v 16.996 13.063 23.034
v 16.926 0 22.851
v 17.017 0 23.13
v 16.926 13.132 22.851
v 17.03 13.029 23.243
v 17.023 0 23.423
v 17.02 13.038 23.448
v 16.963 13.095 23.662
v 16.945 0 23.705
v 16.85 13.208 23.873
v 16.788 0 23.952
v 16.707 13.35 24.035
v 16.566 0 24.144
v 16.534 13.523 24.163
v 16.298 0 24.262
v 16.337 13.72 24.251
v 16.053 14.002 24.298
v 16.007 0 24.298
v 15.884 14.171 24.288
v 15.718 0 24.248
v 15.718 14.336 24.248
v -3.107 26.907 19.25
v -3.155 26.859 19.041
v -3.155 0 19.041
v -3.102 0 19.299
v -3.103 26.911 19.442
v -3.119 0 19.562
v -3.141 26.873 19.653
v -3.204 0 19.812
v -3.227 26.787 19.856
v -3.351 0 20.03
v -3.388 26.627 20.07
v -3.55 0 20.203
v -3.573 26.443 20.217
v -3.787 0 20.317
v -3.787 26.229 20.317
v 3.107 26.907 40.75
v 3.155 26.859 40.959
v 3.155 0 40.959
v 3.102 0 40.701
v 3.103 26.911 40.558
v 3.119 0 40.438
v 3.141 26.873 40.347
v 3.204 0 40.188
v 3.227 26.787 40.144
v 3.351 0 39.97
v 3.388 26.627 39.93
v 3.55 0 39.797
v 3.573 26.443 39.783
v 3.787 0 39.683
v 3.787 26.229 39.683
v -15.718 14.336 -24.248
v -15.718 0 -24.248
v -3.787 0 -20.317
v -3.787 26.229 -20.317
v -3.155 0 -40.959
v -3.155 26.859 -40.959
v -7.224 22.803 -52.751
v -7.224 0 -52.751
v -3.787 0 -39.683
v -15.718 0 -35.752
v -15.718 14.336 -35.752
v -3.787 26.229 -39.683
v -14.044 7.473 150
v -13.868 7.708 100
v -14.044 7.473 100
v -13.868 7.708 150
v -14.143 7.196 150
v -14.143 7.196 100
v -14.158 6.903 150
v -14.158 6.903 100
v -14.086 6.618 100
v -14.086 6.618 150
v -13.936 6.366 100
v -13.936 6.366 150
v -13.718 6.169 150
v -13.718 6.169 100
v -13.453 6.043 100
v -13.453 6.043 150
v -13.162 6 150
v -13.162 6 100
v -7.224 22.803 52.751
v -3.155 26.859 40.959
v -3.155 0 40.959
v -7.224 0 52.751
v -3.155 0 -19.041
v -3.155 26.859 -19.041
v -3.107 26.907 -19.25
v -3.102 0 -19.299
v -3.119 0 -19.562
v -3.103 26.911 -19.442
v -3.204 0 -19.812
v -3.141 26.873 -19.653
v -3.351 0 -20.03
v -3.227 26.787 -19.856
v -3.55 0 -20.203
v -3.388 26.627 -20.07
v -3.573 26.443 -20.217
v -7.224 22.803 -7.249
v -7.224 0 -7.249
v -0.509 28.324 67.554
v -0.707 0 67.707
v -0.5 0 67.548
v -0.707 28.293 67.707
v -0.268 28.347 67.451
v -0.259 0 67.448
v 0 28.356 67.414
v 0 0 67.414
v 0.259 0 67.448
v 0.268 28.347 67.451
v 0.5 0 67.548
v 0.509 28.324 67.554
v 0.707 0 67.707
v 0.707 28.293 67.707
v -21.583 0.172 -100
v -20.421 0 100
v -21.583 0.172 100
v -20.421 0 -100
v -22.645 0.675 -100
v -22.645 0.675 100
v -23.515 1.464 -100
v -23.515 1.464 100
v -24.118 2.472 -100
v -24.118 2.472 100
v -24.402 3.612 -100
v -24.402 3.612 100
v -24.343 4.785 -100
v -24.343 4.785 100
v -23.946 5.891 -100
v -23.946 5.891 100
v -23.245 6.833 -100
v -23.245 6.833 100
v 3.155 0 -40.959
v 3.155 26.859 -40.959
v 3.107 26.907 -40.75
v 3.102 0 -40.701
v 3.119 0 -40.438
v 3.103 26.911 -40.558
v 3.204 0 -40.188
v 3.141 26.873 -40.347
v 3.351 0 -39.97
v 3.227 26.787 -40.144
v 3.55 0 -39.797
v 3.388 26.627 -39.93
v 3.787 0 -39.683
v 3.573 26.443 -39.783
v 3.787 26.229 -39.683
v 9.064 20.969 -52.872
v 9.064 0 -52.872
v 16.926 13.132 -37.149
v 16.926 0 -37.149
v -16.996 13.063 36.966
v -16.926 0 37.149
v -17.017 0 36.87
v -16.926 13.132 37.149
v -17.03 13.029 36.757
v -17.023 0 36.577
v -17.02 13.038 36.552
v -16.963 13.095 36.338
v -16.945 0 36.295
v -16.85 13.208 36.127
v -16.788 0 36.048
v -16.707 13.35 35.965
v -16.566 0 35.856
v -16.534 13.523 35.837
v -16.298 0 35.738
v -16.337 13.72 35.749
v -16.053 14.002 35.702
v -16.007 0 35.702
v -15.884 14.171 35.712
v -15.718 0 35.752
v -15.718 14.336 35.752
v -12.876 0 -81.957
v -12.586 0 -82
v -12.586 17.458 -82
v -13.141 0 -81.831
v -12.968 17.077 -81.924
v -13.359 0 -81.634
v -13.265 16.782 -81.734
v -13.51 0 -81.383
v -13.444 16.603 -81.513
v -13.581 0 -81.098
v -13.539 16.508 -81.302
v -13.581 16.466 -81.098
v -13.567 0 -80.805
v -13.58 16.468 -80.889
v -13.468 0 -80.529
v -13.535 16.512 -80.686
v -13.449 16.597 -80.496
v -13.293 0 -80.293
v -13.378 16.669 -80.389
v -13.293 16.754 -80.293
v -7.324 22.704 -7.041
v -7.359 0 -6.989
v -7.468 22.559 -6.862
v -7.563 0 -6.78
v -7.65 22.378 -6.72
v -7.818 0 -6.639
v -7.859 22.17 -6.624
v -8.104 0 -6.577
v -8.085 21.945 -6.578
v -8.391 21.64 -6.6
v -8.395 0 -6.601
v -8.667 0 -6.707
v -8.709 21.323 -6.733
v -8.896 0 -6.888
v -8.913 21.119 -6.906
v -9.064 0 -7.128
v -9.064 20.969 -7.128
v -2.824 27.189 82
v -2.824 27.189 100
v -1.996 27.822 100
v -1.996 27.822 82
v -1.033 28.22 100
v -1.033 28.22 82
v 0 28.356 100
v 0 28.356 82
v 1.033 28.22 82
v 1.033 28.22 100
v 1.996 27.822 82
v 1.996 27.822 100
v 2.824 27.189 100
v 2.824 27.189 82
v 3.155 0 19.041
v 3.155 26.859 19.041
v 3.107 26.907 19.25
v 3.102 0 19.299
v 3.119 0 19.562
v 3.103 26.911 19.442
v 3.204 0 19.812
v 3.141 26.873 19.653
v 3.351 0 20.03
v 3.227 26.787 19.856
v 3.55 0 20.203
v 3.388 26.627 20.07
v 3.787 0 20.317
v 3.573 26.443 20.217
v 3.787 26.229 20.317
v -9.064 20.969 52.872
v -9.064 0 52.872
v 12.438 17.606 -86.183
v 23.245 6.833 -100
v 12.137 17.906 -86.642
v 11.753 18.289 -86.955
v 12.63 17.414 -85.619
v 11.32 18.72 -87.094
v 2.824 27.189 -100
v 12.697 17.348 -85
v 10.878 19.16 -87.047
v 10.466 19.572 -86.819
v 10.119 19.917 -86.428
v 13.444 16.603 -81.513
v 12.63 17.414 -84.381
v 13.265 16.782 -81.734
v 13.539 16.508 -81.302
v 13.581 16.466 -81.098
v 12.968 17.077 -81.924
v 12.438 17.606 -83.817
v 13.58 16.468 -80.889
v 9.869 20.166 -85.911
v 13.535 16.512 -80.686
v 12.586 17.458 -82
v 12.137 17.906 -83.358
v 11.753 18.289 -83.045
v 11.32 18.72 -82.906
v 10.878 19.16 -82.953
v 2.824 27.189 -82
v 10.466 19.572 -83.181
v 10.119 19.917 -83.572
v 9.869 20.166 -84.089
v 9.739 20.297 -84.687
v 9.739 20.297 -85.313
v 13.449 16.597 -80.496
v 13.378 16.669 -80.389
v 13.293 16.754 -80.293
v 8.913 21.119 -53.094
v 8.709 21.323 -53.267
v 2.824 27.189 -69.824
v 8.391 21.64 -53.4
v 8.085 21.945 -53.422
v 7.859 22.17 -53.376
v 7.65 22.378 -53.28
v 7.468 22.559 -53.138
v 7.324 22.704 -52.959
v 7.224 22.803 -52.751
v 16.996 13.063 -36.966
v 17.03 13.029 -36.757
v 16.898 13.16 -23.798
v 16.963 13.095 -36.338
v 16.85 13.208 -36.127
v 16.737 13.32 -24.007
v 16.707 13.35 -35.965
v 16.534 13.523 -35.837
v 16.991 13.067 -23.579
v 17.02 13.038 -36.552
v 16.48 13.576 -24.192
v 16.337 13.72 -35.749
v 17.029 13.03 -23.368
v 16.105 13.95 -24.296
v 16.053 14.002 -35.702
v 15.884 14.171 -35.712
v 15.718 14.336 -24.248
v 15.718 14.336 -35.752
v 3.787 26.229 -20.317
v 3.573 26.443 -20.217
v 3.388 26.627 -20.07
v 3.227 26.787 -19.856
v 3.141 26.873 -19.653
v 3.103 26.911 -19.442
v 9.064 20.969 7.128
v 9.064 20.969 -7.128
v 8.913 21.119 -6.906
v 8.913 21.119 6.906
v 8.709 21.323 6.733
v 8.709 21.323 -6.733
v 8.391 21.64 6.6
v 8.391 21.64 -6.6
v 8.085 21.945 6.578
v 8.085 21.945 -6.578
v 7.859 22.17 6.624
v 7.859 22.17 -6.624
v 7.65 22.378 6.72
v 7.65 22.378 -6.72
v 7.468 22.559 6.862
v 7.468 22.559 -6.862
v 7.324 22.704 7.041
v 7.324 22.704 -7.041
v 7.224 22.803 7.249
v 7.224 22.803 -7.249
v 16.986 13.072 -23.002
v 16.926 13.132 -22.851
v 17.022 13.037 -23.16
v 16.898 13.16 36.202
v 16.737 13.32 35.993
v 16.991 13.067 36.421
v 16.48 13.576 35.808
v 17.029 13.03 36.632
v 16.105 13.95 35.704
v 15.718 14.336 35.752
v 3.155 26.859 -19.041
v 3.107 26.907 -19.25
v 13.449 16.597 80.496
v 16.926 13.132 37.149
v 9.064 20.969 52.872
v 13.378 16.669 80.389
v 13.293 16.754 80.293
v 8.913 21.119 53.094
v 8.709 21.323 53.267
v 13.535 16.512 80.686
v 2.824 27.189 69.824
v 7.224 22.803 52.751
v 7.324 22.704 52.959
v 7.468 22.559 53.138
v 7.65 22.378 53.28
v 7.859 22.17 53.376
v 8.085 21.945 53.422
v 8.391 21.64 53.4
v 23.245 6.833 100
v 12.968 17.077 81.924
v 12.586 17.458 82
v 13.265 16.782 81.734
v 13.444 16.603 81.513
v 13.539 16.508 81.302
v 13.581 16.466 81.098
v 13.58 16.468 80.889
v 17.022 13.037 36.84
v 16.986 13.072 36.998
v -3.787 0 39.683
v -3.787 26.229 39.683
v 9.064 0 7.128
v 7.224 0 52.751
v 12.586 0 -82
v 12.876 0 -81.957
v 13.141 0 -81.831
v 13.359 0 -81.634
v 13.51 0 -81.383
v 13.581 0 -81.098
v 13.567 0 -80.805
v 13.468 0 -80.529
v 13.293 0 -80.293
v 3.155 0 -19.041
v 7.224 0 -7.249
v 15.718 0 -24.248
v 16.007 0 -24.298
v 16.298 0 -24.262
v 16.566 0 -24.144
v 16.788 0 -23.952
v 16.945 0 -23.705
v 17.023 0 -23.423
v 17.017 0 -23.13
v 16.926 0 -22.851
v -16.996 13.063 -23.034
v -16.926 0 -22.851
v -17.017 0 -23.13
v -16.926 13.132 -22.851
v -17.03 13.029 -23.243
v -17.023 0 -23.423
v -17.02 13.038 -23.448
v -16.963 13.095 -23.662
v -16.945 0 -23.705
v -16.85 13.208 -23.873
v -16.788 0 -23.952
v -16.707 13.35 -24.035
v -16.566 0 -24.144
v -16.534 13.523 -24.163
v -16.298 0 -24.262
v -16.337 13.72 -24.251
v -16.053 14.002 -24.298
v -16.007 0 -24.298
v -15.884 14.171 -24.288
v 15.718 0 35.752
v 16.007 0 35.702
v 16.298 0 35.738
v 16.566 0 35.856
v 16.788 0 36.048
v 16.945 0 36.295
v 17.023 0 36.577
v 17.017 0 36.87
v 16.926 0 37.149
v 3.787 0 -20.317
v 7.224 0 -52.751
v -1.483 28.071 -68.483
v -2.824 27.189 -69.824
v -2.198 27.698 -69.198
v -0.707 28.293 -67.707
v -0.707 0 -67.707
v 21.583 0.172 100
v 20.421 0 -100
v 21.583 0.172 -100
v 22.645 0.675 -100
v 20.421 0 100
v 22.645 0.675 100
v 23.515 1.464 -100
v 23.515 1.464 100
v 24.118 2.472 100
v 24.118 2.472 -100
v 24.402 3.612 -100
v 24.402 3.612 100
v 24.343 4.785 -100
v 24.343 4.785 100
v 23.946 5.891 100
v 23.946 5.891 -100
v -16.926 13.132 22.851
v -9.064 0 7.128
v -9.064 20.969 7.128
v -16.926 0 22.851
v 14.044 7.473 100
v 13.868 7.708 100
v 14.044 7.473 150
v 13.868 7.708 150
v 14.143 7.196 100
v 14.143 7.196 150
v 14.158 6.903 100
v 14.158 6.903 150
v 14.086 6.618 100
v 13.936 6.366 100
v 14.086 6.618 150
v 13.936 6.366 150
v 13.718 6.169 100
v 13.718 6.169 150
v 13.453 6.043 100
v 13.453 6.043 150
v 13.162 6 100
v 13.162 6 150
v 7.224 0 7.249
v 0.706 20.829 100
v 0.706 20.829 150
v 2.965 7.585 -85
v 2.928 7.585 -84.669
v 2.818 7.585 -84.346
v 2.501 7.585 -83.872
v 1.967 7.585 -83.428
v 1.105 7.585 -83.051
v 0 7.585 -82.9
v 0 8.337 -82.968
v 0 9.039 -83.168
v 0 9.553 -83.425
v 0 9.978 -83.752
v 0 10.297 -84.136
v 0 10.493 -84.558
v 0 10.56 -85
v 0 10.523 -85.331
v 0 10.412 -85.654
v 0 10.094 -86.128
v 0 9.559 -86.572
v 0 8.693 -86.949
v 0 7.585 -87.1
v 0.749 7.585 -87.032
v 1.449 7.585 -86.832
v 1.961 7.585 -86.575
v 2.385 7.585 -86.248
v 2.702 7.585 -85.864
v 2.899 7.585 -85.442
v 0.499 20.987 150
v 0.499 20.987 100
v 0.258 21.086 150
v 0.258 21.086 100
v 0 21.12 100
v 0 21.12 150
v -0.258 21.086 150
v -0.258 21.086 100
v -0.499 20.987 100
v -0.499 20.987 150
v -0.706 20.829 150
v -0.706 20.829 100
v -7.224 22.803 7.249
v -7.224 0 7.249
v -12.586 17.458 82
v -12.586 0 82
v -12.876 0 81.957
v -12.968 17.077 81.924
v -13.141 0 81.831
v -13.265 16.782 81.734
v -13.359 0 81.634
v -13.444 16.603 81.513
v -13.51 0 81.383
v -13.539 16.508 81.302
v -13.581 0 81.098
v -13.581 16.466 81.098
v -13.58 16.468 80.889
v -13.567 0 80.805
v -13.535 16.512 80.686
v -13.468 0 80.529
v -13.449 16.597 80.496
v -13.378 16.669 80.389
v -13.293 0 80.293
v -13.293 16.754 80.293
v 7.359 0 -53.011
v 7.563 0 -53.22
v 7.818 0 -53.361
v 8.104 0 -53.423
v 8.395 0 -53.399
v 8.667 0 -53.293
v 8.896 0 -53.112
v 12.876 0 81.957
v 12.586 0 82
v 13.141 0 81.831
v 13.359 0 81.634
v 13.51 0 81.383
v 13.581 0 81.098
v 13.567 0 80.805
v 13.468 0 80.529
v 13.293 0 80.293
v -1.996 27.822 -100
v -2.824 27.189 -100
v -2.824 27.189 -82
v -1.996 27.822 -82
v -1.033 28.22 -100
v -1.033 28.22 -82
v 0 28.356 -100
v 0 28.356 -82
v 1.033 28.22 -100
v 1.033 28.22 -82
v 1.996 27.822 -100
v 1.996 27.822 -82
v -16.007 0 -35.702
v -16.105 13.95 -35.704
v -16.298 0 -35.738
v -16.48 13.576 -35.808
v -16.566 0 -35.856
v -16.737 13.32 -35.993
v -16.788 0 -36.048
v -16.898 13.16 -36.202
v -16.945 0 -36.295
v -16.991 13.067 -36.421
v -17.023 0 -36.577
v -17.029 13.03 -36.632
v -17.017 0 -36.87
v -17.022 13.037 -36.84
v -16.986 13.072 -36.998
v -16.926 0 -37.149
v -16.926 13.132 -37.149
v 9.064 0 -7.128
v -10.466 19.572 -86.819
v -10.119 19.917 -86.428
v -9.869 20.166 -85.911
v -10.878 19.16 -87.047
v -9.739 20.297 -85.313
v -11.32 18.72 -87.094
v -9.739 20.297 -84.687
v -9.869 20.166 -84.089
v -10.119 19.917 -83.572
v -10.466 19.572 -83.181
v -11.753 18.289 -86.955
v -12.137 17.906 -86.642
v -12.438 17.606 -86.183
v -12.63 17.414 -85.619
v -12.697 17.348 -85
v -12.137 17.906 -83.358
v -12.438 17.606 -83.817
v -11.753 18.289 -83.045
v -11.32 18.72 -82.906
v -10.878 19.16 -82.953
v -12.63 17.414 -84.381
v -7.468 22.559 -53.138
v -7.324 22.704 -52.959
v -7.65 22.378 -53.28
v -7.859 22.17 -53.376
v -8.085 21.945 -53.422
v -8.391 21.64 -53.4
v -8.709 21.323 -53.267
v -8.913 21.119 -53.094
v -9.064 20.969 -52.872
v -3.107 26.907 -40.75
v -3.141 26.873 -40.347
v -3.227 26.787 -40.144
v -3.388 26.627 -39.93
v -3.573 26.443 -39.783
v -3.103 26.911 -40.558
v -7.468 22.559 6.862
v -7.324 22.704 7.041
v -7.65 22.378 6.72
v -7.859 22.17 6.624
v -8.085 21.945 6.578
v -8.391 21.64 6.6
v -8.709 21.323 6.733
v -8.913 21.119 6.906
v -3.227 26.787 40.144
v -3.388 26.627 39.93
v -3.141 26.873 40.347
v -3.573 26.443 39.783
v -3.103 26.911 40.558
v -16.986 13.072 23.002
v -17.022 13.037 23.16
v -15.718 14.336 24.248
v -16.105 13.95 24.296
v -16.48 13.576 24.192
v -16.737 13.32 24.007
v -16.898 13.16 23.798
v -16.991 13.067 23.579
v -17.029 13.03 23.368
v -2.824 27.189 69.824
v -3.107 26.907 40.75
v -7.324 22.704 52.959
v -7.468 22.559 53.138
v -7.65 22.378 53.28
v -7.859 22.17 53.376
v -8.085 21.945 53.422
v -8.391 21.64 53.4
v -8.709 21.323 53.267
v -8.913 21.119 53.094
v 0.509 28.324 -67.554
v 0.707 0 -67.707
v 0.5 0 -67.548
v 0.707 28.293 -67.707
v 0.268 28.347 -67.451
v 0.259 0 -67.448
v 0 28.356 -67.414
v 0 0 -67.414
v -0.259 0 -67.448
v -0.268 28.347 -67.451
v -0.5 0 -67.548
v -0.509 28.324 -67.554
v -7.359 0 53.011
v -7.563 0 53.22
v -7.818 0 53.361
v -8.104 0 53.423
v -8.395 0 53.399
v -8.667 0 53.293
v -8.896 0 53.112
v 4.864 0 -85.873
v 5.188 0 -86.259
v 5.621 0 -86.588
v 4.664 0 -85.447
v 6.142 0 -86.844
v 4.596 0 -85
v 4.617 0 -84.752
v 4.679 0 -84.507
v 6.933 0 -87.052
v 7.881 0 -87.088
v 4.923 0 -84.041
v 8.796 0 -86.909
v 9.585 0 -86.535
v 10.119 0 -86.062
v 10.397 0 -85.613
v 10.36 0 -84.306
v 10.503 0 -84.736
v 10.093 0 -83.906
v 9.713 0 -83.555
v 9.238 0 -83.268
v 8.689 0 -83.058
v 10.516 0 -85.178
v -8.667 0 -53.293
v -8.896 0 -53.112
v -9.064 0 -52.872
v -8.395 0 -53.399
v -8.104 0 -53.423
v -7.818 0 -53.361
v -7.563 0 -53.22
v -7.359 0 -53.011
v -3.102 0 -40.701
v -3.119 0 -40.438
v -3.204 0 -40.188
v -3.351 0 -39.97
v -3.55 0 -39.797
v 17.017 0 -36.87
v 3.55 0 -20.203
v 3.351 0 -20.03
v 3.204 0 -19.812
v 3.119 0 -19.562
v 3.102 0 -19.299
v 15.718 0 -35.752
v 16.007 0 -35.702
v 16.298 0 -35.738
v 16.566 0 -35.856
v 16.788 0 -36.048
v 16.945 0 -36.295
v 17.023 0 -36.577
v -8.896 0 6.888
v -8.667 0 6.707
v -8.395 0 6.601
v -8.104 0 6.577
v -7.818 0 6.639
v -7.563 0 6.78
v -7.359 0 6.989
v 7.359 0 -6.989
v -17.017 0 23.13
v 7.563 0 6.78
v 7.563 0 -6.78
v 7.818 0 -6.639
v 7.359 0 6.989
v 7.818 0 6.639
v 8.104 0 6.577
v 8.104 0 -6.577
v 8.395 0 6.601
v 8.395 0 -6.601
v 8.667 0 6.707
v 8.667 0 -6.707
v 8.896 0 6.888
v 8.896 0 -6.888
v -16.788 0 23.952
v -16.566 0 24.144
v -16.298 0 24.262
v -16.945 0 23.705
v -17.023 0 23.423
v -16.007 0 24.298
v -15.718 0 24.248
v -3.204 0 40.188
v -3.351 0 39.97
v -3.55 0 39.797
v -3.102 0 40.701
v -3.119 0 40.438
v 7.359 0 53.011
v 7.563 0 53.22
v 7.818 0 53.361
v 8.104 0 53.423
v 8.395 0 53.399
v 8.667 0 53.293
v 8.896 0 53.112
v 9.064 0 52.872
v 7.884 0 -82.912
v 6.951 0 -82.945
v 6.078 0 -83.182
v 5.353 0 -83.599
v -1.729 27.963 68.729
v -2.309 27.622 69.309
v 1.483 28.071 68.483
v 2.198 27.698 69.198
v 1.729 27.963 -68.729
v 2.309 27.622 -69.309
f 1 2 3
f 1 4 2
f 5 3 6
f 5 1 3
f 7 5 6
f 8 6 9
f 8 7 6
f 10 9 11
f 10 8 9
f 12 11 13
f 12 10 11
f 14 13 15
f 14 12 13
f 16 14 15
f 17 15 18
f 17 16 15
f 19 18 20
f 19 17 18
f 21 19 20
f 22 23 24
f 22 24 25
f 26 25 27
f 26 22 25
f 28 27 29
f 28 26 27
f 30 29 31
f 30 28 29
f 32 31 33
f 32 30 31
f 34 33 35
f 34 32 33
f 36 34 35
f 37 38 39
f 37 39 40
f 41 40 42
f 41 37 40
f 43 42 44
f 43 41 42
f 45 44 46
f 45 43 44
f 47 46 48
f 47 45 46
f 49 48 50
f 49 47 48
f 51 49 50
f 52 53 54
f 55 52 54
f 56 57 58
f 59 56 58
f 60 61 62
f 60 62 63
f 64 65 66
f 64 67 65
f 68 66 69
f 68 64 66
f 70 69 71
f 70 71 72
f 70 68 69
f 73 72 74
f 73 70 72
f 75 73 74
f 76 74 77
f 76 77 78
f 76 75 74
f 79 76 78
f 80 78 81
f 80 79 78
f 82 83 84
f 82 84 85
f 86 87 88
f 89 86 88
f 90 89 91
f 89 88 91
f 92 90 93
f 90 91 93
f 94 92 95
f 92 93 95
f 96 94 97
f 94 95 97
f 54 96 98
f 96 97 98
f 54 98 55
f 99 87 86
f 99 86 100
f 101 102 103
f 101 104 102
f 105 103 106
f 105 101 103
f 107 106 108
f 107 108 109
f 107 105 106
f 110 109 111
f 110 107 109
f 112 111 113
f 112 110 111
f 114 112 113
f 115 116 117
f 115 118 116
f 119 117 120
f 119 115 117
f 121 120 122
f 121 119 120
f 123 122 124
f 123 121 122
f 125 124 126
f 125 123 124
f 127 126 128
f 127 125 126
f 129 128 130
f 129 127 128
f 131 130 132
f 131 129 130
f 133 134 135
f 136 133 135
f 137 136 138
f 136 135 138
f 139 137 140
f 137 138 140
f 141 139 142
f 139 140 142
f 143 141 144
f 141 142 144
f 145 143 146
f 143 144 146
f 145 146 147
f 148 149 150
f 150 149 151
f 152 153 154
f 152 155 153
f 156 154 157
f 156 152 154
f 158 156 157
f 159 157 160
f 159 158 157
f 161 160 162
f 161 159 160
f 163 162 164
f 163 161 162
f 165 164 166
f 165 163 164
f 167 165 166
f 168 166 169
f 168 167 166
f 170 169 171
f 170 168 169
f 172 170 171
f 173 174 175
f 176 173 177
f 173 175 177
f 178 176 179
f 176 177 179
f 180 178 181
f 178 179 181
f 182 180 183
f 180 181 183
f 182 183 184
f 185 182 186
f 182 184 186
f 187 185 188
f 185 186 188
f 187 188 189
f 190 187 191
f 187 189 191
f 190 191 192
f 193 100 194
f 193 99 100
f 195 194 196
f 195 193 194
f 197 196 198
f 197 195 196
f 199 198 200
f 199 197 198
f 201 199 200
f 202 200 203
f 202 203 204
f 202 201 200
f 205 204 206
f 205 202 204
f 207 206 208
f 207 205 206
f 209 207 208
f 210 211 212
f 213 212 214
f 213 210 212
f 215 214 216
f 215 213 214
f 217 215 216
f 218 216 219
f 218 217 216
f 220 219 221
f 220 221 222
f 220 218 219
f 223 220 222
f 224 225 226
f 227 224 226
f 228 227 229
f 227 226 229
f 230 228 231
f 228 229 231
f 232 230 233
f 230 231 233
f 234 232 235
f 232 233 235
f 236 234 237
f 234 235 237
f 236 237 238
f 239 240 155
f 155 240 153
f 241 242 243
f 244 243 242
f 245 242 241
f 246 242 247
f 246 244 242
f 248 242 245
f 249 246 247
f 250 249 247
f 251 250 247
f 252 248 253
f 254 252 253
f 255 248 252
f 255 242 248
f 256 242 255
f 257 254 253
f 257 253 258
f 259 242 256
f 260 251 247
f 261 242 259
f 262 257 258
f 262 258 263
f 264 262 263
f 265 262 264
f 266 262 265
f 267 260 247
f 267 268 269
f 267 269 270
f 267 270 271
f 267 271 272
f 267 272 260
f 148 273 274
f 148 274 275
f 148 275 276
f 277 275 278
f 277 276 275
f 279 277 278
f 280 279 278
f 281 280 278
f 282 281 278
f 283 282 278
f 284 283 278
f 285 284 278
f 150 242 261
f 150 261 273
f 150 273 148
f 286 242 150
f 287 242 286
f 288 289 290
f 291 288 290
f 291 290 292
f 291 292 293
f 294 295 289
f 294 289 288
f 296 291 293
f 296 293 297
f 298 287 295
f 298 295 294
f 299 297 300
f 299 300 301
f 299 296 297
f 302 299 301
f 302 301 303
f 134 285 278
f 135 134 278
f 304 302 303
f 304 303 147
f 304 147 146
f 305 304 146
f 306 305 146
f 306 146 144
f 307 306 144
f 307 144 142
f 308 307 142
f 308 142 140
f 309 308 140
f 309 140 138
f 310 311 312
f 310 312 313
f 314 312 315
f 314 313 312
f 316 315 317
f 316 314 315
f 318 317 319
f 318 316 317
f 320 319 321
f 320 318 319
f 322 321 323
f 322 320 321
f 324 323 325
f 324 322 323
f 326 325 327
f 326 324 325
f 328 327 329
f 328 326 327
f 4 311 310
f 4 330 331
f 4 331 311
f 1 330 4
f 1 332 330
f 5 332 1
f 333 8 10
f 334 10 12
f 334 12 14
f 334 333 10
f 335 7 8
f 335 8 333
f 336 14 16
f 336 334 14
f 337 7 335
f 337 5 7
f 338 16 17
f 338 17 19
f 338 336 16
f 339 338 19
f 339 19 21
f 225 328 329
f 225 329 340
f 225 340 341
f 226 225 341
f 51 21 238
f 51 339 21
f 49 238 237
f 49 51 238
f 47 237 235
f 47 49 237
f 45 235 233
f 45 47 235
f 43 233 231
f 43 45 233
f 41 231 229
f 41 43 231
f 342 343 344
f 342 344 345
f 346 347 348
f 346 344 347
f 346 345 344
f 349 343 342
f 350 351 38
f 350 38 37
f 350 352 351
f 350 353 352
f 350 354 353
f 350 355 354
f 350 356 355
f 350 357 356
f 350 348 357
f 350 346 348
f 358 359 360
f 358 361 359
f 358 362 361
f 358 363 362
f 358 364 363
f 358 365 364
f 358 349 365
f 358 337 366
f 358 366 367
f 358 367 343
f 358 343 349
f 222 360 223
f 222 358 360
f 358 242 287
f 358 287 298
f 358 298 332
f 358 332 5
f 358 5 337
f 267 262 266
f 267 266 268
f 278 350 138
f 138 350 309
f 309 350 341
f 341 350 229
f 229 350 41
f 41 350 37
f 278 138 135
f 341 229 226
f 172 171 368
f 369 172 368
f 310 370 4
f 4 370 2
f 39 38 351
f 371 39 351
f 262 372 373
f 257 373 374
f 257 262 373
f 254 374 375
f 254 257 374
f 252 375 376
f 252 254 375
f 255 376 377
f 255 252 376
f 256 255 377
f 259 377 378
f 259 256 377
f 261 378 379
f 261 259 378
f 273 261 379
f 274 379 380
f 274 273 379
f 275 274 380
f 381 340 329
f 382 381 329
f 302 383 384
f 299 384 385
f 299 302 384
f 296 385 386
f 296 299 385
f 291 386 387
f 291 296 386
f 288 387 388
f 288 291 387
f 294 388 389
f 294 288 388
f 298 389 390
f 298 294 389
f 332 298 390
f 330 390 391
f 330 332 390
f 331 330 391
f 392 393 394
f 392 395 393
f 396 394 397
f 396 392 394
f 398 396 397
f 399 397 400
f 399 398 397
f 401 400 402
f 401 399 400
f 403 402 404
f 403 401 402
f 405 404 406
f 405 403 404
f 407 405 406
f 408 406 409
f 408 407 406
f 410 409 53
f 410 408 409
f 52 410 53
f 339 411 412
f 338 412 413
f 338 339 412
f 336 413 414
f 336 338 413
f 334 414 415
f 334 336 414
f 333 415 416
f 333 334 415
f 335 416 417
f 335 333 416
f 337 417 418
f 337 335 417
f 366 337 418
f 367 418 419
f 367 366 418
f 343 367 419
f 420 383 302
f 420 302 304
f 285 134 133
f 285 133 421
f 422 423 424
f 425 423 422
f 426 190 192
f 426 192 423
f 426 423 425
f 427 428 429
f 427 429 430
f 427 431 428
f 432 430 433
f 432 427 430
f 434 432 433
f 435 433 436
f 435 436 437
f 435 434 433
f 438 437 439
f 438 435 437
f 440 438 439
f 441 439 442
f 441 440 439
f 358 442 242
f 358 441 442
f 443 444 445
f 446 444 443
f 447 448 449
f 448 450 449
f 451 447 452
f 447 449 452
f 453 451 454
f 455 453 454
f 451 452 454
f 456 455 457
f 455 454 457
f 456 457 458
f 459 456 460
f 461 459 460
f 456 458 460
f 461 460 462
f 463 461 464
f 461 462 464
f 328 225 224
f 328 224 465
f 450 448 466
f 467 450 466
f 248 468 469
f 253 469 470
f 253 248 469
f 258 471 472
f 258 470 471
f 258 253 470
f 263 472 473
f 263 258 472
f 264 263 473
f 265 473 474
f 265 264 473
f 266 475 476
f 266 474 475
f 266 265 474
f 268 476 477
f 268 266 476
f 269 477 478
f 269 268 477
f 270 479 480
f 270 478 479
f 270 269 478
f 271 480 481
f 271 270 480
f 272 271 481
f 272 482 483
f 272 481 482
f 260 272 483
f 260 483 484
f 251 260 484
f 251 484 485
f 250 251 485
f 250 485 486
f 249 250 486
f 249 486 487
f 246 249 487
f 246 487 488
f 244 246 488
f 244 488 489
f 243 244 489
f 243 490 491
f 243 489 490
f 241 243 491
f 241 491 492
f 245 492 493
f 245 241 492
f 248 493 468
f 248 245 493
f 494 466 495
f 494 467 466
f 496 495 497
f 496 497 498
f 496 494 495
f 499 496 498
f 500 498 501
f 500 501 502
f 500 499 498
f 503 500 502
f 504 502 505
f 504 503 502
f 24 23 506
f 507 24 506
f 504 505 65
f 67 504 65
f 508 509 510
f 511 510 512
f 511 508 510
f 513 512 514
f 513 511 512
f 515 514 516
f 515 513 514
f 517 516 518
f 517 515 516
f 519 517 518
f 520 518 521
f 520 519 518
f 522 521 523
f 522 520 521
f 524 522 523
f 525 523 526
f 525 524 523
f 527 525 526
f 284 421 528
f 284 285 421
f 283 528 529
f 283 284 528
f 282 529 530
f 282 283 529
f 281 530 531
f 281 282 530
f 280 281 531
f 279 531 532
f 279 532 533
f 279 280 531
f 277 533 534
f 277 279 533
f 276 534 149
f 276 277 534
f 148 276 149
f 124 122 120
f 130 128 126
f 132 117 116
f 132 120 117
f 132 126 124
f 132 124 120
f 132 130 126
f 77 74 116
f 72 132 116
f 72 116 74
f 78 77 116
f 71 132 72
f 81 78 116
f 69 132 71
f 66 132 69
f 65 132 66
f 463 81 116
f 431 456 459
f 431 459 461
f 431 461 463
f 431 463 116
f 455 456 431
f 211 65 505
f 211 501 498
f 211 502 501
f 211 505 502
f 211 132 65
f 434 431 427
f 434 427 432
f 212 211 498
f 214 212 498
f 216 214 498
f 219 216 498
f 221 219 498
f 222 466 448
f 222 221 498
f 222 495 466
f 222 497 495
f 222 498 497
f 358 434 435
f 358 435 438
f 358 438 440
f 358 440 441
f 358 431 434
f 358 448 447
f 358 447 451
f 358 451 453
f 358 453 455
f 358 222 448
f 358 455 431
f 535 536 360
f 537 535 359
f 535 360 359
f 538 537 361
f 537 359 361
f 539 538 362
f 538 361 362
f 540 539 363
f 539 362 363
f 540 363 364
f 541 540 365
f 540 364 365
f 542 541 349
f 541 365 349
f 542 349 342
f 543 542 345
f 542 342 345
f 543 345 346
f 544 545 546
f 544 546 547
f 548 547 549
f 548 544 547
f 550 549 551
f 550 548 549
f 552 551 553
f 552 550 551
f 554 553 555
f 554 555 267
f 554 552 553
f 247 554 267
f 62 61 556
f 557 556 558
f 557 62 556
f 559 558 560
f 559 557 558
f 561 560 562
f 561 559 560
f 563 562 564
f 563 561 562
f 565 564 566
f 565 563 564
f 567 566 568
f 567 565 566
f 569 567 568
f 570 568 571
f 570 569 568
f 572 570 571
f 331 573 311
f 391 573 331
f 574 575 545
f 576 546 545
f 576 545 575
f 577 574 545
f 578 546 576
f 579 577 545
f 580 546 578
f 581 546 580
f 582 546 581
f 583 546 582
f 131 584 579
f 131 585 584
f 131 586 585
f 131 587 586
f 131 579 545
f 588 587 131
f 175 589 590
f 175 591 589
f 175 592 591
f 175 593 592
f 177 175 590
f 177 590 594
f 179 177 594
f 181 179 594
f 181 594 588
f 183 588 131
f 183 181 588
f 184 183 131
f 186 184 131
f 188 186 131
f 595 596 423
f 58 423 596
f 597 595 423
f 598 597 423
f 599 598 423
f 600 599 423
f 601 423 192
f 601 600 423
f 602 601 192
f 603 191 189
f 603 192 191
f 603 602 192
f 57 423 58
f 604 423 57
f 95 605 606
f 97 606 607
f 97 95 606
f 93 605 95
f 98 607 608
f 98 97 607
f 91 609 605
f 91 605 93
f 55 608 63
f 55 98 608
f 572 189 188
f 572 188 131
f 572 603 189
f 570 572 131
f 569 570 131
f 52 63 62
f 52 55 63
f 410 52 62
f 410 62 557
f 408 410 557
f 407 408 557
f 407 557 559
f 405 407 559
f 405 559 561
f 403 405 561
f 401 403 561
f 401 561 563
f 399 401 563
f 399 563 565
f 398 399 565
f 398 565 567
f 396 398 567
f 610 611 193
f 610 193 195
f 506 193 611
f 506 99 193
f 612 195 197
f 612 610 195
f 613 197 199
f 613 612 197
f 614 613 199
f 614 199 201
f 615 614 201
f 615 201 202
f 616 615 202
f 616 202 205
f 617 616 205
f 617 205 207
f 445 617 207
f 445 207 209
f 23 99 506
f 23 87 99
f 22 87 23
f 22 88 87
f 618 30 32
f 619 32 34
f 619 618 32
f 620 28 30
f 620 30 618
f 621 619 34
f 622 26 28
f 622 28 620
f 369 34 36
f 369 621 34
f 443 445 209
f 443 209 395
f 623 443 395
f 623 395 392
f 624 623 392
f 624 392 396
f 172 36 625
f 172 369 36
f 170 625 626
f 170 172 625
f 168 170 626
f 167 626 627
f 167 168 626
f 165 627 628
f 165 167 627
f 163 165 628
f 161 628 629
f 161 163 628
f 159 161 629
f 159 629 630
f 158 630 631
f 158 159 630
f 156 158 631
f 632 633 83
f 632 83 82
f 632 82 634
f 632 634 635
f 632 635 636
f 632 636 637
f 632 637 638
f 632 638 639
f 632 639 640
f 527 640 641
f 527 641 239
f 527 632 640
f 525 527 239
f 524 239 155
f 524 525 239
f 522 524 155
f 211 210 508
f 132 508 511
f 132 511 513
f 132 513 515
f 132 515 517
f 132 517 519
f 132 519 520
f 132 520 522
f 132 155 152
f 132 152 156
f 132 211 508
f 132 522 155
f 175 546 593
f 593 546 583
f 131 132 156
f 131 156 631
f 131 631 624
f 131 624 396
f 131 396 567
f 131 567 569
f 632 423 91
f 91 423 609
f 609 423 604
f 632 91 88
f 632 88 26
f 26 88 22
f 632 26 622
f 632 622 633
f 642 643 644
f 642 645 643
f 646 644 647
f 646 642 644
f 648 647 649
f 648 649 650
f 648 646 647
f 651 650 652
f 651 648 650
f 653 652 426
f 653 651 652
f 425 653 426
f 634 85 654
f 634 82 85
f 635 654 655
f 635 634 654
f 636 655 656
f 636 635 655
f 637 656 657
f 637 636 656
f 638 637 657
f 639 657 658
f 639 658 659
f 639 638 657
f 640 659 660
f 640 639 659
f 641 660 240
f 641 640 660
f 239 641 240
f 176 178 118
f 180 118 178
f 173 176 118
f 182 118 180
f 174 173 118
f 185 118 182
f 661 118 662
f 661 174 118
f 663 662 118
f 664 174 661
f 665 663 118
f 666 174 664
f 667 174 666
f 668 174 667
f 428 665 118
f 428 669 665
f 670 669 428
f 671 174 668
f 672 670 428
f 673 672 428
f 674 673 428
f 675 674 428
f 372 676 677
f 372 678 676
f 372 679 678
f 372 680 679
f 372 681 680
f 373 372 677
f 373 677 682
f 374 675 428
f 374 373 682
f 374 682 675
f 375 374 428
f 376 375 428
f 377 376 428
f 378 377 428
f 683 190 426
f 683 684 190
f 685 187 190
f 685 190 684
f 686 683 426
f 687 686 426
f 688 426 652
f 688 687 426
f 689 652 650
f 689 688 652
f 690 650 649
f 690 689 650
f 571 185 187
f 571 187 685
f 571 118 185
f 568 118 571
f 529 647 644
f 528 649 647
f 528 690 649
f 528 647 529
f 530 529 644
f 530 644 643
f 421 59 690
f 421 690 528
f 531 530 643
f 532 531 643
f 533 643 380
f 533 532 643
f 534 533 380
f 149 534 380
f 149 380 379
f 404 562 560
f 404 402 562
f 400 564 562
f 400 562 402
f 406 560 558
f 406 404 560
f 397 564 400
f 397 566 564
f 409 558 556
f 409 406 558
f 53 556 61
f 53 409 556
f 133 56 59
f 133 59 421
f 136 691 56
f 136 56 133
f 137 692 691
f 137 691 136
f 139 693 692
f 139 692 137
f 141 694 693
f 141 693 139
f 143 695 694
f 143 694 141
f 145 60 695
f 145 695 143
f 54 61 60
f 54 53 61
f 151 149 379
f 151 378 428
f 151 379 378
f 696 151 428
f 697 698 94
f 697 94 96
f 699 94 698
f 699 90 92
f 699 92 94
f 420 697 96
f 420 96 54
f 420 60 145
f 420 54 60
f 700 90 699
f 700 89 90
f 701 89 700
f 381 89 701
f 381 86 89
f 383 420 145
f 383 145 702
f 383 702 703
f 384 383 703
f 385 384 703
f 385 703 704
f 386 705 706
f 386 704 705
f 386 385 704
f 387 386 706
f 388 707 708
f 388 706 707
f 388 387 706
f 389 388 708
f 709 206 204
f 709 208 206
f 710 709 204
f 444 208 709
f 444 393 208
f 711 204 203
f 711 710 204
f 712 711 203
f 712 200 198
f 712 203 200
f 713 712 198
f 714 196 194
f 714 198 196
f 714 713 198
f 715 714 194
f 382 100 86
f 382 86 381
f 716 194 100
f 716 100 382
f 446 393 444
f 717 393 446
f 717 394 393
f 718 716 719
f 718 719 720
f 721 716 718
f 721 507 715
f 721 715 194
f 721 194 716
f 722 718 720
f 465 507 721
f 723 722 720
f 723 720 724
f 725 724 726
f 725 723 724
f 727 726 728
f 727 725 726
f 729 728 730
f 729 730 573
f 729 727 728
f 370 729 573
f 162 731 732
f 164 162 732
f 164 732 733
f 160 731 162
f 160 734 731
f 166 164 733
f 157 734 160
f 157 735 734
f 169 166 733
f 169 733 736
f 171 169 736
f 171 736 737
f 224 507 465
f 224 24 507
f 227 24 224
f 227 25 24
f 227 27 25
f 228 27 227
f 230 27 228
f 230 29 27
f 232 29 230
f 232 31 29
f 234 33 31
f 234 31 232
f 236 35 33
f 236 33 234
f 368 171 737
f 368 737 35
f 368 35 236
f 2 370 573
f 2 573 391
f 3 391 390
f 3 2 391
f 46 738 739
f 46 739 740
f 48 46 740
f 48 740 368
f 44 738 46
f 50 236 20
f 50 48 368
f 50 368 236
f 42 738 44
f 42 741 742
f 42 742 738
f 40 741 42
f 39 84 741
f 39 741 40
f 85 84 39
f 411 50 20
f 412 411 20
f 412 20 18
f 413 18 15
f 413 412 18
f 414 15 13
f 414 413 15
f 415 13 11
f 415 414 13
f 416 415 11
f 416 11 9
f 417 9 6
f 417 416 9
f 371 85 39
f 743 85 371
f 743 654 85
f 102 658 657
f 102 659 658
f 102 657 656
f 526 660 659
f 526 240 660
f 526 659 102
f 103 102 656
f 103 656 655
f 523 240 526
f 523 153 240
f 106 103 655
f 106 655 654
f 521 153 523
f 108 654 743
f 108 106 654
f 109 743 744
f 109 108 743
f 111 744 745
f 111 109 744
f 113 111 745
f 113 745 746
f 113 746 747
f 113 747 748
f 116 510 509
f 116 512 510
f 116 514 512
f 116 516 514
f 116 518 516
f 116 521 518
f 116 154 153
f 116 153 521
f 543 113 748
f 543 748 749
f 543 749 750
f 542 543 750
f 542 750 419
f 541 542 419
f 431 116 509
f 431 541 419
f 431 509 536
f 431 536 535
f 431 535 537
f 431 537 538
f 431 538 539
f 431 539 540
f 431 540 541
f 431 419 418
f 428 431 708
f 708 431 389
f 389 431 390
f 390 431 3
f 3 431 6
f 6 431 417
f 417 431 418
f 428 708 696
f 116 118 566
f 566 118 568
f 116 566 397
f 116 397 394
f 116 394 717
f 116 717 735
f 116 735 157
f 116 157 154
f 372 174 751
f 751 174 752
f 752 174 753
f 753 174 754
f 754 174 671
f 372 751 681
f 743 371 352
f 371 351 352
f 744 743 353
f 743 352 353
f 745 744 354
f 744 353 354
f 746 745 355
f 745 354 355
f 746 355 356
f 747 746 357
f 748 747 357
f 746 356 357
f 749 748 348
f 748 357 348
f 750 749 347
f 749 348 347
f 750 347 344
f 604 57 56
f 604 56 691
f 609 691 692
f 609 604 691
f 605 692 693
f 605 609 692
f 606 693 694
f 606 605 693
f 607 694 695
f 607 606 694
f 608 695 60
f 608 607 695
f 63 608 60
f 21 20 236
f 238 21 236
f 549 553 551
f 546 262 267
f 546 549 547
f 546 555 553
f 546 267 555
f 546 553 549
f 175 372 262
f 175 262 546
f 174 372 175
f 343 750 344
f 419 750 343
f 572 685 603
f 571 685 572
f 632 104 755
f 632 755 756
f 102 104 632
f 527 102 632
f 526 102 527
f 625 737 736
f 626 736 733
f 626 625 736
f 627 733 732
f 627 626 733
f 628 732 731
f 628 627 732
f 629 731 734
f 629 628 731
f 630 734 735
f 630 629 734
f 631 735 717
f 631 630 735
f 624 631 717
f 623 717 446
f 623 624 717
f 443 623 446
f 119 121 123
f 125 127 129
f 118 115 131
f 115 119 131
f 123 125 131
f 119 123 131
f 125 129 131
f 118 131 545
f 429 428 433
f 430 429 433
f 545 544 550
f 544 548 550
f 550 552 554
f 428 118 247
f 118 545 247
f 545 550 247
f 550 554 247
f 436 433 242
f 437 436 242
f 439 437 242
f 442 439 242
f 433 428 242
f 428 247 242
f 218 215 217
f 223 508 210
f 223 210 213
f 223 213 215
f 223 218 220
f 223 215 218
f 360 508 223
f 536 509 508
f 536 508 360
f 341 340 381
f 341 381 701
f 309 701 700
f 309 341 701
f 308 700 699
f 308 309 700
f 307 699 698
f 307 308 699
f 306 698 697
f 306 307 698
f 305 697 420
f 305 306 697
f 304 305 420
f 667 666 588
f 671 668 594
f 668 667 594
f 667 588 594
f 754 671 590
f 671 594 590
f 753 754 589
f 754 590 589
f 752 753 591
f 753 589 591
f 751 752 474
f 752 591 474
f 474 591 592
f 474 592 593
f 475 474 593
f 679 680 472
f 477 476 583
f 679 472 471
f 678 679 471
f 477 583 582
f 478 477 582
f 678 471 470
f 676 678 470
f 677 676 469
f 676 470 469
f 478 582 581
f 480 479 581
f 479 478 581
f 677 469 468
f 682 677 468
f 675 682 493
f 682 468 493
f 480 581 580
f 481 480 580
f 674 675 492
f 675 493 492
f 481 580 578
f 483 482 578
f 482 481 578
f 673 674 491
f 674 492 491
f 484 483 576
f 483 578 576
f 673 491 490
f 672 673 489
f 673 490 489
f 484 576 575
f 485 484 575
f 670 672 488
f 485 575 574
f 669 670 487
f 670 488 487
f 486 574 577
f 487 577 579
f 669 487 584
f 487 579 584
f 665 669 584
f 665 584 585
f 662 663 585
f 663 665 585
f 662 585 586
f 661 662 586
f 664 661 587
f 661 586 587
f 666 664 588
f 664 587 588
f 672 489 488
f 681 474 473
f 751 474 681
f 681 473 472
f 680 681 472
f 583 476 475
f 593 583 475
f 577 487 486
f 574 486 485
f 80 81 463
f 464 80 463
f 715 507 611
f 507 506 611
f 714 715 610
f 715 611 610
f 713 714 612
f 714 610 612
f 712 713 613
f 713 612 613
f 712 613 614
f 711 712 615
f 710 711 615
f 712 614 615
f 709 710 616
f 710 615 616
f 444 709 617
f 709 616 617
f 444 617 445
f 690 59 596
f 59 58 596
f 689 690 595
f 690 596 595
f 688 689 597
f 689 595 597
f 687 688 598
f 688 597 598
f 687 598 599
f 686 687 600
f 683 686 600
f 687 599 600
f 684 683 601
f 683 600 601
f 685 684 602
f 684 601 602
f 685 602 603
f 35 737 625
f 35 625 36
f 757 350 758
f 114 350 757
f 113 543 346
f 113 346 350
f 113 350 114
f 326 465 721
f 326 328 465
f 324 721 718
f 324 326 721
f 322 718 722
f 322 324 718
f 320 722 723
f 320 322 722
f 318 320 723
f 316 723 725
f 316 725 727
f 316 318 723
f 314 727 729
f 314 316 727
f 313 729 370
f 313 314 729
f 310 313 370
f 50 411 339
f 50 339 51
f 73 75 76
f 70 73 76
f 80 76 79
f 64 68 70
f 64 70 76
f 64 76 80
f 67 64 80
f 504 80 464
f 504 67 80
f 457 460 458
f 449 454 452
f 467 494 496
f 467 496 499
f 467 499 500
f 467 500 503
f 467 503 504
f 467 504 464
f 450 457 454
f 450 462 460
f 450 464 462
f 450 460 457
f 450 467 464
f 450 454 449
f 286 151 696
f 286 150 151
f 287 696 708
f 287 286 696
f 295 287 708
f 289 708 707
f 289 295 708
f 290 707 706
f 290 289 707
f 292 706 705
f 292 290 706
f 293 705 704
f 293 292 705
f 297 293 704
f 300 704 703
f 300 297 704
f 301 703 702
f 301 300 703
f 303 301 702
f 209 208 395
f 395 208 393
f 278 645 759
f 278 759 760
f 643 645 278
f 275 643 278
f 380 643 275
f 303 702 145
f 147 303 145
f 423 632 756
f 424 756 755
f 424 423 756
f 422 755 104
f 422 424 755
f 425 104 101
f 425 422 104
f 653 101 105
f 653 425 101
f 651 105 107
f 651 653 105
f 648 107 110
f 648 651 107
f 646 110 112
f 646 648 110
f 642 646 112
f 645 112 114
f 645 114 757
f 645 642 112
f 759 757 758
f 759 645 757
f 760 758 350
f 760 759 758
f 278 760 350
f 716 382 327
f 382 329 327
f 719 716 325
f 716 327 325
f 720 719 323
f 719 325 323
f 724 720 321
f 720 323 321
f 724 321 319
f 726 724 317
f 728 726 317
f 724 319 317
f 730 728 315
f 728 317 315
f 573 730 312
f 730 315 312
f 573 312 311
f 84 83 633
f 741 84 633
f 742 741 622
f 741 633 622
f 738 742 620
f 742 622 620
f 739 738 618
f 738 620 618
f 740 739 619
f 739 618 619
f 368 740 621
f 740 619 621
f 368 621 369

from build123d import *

# Parameters (mm, degrees)
EXTRUDE_1_DEPTH     = 100
FILLET_1_R          = 4
EXTRUDE_2_DEPTH     = 50
FILLET_2_R          = 1
CUT_EXTRUDE_1_DEPTH = 155.597772267
FILLET_3_R          = 1
CUT_EXTRUDE_2_REACH = 157.823
SKETCH_4_R          = 2.099999206


with BuildPart() as part:
    # 草图1 → 凸台-拉伸1 (new, symmetric)
    with BuildSketch(Plane.XY):
        Polygon((-30.1, 0), (30.1, 0), (0, 30.003999733), align=None)
    extrude(amount=EXTRUDE_1_DEPTH, both=True)

    # 圆角1
    fillet_1_edges = [part.edges().sort_by_distance(p)[0] for p in [
        (0, 30.003999733, 0),
        (30.1, 0, 0),
        (-30.1, 0, 0),
    ]]
    fillet(fillet_1_edges, radius=FILLET_1_R)

    # 草图2 → 凸台-拉伸2 (add)
    with BuildSketch(Plane.XY.offset(100)):
        Polygon((15.581935613, 6), (0, 21.532238936), (-15.581935613, 6), align=None)
    extrude(amount=EXTRUDE_2_DEPTH)

    # 圆角2
    fillet_2_edges = [part.edges().sort_by_distance(p)[0] for p in [
        (-15.581935613, 6, 125),
        (15.581935613, 6, 125),
        (0, 21.532238936, 125),
    ]]
    fillet(fillet_2_edges, radius=FILLET_2_R)

    # 草图3 → 切除-拉伸1 (cut, through all)
    with BuildSketch(Plane(origin=(0, 0, 0), x_dir=(1, 0, 0), z_dir=(0, 1, 0))):
        Polygon((-15, 82), (0, 67), (15, 82), align=None)
        Polygon((-8, 55), (-18, 35), (-2.823905857, 40), align=None)
        Polygon((2.823905857, 40), (8, 55), (18, 35), align=None)
        Polygon((8, 5), (18, 25), (2.823905857, 20), align=None)
        Polygon((-2.823905857, 20), (-8, 5), (-18, 25), align=None)
        Polygon((-8, -5), (-18, -25), (-2.823905857, -20), align=None)
        Polygon((2.823905857, -20), (8, -5), (18, -25), align=None)
        Polygon((8, -55), (18, -35), (2.823905857, -40), align=None)
        Polygon((-2.823905857, -40), (-8, -55), (-18, -35), align=None)
        Polygon((15, -82), (0, -67), (-15, -82), align=None)
    extrude(amount=CUT_EXTRUDE_1_DEPTH, mode=Mode.SUBTRACT)

    # 圆角3
    fillet_3_edges = [part.edges().sort_by_distance(p)[0] for p in [
        (0, 14.178079601, -67),
        (-15, 7.525920199, -82),
        (2.823905857, 13.594550189, -40),
        (8, 11.014757377, -55),
        (18, 6.030704265, -35),
        (-2.823905857, 13.594550189, -20),
        (-8, 11.014757377, -5),
        (-18, 6.030704265, -25),
        (2.823905857, 13.594550189, 20),
        (8, 11.014757377, 5),
        (18, 6.030704265, 25),
        (-2.823905857, 13.594550189, 40),
        (-8, 11.014757377, 55),
        (-18, 6.030704265, 35),
        (-15, 7.525920199, 82),
        (0, 14.178079601, 67),
        (15, 7.525920199, 82),
        (2.823905857, 13.594550189, 40),
        (18, 6.030704265, 35),
        (8, 11.014757377, 55),
        (-2.823905857, 13.594550189, 20),
        (-18, 6.030704265, 25),
        (-8, 11.014757377, 5),
        (2.823905857, 13.594550189, -20),
        (18, 6.030704265, -25),
        (8, 11.014757377, -5),
        (-2.823905857, 13.594550189, -40),
        (-18, 6.030704265, -35),
        (-8, 11.014757377, -55),
        (15, 7.525920199, -82),
    ]]
    fillet(fillet_3_edges, radius=FILLET_3_R)

    # 草图4 → 切除-拉伸2 (cut, up to next)
    with BuildSketch(Plane(origin=(-15.001923322, 15.04992321, 0), x_dir=(0.7082352941176472, 0.705976464314562, 0), z_dir=(-0.705976464314562, 0.7082352941176472, 0)), mode=Mode.PRIVATE) as cut_extrude_2_sk1:
        with Locations(Location((5.355142644, 85, 0), (0, 0, 180))):
            Circle(SKETCH_4_R)
    cut_extrude_2_tool1 = extrude(cut_extrude_2_sk1.sketch, amount=-CUT_EXTRUDE_2_REACH, mode=Mode.PRIVATE) & part.part
    cut_extrude_2 = cut_extrude_2_tool1.solids().sort_by_distance((-11.209222, 18.830528, -85))[0]
    add(cut_extrude_2, mode=Mode.SUBTRACT)

    # 镜向1: 切除-拉伸2 mirrored; each copy of 切除-拉伸2 runs up to whatever stops it at its own place
    mirror_1_before = part.part  # the part as the pattern finds it: every copy runs up to it
    mirror_1_cut_extrude_2_long = extrude(cut_extrude_2_sk1.sketch, amount=-CUT_EXTRUDE_2_REACH, mode=Mode.PRIVATE)
    mirror_1_cut_extrude_2_tool1 = mirror_1_cut_extrude_2_long.mirror(Plane(origin=(0, 0, 0), x_dir=(0, 0, 1), z_dir=(1, 0, 0))) & mirror_1_before
    add(mirror_1_cut_extrude_2_tool1.solids().sort_by_distance((11.209222, 18.830528, -85))[0], mode=Mode.SUBTRACT)


solid = part.part
